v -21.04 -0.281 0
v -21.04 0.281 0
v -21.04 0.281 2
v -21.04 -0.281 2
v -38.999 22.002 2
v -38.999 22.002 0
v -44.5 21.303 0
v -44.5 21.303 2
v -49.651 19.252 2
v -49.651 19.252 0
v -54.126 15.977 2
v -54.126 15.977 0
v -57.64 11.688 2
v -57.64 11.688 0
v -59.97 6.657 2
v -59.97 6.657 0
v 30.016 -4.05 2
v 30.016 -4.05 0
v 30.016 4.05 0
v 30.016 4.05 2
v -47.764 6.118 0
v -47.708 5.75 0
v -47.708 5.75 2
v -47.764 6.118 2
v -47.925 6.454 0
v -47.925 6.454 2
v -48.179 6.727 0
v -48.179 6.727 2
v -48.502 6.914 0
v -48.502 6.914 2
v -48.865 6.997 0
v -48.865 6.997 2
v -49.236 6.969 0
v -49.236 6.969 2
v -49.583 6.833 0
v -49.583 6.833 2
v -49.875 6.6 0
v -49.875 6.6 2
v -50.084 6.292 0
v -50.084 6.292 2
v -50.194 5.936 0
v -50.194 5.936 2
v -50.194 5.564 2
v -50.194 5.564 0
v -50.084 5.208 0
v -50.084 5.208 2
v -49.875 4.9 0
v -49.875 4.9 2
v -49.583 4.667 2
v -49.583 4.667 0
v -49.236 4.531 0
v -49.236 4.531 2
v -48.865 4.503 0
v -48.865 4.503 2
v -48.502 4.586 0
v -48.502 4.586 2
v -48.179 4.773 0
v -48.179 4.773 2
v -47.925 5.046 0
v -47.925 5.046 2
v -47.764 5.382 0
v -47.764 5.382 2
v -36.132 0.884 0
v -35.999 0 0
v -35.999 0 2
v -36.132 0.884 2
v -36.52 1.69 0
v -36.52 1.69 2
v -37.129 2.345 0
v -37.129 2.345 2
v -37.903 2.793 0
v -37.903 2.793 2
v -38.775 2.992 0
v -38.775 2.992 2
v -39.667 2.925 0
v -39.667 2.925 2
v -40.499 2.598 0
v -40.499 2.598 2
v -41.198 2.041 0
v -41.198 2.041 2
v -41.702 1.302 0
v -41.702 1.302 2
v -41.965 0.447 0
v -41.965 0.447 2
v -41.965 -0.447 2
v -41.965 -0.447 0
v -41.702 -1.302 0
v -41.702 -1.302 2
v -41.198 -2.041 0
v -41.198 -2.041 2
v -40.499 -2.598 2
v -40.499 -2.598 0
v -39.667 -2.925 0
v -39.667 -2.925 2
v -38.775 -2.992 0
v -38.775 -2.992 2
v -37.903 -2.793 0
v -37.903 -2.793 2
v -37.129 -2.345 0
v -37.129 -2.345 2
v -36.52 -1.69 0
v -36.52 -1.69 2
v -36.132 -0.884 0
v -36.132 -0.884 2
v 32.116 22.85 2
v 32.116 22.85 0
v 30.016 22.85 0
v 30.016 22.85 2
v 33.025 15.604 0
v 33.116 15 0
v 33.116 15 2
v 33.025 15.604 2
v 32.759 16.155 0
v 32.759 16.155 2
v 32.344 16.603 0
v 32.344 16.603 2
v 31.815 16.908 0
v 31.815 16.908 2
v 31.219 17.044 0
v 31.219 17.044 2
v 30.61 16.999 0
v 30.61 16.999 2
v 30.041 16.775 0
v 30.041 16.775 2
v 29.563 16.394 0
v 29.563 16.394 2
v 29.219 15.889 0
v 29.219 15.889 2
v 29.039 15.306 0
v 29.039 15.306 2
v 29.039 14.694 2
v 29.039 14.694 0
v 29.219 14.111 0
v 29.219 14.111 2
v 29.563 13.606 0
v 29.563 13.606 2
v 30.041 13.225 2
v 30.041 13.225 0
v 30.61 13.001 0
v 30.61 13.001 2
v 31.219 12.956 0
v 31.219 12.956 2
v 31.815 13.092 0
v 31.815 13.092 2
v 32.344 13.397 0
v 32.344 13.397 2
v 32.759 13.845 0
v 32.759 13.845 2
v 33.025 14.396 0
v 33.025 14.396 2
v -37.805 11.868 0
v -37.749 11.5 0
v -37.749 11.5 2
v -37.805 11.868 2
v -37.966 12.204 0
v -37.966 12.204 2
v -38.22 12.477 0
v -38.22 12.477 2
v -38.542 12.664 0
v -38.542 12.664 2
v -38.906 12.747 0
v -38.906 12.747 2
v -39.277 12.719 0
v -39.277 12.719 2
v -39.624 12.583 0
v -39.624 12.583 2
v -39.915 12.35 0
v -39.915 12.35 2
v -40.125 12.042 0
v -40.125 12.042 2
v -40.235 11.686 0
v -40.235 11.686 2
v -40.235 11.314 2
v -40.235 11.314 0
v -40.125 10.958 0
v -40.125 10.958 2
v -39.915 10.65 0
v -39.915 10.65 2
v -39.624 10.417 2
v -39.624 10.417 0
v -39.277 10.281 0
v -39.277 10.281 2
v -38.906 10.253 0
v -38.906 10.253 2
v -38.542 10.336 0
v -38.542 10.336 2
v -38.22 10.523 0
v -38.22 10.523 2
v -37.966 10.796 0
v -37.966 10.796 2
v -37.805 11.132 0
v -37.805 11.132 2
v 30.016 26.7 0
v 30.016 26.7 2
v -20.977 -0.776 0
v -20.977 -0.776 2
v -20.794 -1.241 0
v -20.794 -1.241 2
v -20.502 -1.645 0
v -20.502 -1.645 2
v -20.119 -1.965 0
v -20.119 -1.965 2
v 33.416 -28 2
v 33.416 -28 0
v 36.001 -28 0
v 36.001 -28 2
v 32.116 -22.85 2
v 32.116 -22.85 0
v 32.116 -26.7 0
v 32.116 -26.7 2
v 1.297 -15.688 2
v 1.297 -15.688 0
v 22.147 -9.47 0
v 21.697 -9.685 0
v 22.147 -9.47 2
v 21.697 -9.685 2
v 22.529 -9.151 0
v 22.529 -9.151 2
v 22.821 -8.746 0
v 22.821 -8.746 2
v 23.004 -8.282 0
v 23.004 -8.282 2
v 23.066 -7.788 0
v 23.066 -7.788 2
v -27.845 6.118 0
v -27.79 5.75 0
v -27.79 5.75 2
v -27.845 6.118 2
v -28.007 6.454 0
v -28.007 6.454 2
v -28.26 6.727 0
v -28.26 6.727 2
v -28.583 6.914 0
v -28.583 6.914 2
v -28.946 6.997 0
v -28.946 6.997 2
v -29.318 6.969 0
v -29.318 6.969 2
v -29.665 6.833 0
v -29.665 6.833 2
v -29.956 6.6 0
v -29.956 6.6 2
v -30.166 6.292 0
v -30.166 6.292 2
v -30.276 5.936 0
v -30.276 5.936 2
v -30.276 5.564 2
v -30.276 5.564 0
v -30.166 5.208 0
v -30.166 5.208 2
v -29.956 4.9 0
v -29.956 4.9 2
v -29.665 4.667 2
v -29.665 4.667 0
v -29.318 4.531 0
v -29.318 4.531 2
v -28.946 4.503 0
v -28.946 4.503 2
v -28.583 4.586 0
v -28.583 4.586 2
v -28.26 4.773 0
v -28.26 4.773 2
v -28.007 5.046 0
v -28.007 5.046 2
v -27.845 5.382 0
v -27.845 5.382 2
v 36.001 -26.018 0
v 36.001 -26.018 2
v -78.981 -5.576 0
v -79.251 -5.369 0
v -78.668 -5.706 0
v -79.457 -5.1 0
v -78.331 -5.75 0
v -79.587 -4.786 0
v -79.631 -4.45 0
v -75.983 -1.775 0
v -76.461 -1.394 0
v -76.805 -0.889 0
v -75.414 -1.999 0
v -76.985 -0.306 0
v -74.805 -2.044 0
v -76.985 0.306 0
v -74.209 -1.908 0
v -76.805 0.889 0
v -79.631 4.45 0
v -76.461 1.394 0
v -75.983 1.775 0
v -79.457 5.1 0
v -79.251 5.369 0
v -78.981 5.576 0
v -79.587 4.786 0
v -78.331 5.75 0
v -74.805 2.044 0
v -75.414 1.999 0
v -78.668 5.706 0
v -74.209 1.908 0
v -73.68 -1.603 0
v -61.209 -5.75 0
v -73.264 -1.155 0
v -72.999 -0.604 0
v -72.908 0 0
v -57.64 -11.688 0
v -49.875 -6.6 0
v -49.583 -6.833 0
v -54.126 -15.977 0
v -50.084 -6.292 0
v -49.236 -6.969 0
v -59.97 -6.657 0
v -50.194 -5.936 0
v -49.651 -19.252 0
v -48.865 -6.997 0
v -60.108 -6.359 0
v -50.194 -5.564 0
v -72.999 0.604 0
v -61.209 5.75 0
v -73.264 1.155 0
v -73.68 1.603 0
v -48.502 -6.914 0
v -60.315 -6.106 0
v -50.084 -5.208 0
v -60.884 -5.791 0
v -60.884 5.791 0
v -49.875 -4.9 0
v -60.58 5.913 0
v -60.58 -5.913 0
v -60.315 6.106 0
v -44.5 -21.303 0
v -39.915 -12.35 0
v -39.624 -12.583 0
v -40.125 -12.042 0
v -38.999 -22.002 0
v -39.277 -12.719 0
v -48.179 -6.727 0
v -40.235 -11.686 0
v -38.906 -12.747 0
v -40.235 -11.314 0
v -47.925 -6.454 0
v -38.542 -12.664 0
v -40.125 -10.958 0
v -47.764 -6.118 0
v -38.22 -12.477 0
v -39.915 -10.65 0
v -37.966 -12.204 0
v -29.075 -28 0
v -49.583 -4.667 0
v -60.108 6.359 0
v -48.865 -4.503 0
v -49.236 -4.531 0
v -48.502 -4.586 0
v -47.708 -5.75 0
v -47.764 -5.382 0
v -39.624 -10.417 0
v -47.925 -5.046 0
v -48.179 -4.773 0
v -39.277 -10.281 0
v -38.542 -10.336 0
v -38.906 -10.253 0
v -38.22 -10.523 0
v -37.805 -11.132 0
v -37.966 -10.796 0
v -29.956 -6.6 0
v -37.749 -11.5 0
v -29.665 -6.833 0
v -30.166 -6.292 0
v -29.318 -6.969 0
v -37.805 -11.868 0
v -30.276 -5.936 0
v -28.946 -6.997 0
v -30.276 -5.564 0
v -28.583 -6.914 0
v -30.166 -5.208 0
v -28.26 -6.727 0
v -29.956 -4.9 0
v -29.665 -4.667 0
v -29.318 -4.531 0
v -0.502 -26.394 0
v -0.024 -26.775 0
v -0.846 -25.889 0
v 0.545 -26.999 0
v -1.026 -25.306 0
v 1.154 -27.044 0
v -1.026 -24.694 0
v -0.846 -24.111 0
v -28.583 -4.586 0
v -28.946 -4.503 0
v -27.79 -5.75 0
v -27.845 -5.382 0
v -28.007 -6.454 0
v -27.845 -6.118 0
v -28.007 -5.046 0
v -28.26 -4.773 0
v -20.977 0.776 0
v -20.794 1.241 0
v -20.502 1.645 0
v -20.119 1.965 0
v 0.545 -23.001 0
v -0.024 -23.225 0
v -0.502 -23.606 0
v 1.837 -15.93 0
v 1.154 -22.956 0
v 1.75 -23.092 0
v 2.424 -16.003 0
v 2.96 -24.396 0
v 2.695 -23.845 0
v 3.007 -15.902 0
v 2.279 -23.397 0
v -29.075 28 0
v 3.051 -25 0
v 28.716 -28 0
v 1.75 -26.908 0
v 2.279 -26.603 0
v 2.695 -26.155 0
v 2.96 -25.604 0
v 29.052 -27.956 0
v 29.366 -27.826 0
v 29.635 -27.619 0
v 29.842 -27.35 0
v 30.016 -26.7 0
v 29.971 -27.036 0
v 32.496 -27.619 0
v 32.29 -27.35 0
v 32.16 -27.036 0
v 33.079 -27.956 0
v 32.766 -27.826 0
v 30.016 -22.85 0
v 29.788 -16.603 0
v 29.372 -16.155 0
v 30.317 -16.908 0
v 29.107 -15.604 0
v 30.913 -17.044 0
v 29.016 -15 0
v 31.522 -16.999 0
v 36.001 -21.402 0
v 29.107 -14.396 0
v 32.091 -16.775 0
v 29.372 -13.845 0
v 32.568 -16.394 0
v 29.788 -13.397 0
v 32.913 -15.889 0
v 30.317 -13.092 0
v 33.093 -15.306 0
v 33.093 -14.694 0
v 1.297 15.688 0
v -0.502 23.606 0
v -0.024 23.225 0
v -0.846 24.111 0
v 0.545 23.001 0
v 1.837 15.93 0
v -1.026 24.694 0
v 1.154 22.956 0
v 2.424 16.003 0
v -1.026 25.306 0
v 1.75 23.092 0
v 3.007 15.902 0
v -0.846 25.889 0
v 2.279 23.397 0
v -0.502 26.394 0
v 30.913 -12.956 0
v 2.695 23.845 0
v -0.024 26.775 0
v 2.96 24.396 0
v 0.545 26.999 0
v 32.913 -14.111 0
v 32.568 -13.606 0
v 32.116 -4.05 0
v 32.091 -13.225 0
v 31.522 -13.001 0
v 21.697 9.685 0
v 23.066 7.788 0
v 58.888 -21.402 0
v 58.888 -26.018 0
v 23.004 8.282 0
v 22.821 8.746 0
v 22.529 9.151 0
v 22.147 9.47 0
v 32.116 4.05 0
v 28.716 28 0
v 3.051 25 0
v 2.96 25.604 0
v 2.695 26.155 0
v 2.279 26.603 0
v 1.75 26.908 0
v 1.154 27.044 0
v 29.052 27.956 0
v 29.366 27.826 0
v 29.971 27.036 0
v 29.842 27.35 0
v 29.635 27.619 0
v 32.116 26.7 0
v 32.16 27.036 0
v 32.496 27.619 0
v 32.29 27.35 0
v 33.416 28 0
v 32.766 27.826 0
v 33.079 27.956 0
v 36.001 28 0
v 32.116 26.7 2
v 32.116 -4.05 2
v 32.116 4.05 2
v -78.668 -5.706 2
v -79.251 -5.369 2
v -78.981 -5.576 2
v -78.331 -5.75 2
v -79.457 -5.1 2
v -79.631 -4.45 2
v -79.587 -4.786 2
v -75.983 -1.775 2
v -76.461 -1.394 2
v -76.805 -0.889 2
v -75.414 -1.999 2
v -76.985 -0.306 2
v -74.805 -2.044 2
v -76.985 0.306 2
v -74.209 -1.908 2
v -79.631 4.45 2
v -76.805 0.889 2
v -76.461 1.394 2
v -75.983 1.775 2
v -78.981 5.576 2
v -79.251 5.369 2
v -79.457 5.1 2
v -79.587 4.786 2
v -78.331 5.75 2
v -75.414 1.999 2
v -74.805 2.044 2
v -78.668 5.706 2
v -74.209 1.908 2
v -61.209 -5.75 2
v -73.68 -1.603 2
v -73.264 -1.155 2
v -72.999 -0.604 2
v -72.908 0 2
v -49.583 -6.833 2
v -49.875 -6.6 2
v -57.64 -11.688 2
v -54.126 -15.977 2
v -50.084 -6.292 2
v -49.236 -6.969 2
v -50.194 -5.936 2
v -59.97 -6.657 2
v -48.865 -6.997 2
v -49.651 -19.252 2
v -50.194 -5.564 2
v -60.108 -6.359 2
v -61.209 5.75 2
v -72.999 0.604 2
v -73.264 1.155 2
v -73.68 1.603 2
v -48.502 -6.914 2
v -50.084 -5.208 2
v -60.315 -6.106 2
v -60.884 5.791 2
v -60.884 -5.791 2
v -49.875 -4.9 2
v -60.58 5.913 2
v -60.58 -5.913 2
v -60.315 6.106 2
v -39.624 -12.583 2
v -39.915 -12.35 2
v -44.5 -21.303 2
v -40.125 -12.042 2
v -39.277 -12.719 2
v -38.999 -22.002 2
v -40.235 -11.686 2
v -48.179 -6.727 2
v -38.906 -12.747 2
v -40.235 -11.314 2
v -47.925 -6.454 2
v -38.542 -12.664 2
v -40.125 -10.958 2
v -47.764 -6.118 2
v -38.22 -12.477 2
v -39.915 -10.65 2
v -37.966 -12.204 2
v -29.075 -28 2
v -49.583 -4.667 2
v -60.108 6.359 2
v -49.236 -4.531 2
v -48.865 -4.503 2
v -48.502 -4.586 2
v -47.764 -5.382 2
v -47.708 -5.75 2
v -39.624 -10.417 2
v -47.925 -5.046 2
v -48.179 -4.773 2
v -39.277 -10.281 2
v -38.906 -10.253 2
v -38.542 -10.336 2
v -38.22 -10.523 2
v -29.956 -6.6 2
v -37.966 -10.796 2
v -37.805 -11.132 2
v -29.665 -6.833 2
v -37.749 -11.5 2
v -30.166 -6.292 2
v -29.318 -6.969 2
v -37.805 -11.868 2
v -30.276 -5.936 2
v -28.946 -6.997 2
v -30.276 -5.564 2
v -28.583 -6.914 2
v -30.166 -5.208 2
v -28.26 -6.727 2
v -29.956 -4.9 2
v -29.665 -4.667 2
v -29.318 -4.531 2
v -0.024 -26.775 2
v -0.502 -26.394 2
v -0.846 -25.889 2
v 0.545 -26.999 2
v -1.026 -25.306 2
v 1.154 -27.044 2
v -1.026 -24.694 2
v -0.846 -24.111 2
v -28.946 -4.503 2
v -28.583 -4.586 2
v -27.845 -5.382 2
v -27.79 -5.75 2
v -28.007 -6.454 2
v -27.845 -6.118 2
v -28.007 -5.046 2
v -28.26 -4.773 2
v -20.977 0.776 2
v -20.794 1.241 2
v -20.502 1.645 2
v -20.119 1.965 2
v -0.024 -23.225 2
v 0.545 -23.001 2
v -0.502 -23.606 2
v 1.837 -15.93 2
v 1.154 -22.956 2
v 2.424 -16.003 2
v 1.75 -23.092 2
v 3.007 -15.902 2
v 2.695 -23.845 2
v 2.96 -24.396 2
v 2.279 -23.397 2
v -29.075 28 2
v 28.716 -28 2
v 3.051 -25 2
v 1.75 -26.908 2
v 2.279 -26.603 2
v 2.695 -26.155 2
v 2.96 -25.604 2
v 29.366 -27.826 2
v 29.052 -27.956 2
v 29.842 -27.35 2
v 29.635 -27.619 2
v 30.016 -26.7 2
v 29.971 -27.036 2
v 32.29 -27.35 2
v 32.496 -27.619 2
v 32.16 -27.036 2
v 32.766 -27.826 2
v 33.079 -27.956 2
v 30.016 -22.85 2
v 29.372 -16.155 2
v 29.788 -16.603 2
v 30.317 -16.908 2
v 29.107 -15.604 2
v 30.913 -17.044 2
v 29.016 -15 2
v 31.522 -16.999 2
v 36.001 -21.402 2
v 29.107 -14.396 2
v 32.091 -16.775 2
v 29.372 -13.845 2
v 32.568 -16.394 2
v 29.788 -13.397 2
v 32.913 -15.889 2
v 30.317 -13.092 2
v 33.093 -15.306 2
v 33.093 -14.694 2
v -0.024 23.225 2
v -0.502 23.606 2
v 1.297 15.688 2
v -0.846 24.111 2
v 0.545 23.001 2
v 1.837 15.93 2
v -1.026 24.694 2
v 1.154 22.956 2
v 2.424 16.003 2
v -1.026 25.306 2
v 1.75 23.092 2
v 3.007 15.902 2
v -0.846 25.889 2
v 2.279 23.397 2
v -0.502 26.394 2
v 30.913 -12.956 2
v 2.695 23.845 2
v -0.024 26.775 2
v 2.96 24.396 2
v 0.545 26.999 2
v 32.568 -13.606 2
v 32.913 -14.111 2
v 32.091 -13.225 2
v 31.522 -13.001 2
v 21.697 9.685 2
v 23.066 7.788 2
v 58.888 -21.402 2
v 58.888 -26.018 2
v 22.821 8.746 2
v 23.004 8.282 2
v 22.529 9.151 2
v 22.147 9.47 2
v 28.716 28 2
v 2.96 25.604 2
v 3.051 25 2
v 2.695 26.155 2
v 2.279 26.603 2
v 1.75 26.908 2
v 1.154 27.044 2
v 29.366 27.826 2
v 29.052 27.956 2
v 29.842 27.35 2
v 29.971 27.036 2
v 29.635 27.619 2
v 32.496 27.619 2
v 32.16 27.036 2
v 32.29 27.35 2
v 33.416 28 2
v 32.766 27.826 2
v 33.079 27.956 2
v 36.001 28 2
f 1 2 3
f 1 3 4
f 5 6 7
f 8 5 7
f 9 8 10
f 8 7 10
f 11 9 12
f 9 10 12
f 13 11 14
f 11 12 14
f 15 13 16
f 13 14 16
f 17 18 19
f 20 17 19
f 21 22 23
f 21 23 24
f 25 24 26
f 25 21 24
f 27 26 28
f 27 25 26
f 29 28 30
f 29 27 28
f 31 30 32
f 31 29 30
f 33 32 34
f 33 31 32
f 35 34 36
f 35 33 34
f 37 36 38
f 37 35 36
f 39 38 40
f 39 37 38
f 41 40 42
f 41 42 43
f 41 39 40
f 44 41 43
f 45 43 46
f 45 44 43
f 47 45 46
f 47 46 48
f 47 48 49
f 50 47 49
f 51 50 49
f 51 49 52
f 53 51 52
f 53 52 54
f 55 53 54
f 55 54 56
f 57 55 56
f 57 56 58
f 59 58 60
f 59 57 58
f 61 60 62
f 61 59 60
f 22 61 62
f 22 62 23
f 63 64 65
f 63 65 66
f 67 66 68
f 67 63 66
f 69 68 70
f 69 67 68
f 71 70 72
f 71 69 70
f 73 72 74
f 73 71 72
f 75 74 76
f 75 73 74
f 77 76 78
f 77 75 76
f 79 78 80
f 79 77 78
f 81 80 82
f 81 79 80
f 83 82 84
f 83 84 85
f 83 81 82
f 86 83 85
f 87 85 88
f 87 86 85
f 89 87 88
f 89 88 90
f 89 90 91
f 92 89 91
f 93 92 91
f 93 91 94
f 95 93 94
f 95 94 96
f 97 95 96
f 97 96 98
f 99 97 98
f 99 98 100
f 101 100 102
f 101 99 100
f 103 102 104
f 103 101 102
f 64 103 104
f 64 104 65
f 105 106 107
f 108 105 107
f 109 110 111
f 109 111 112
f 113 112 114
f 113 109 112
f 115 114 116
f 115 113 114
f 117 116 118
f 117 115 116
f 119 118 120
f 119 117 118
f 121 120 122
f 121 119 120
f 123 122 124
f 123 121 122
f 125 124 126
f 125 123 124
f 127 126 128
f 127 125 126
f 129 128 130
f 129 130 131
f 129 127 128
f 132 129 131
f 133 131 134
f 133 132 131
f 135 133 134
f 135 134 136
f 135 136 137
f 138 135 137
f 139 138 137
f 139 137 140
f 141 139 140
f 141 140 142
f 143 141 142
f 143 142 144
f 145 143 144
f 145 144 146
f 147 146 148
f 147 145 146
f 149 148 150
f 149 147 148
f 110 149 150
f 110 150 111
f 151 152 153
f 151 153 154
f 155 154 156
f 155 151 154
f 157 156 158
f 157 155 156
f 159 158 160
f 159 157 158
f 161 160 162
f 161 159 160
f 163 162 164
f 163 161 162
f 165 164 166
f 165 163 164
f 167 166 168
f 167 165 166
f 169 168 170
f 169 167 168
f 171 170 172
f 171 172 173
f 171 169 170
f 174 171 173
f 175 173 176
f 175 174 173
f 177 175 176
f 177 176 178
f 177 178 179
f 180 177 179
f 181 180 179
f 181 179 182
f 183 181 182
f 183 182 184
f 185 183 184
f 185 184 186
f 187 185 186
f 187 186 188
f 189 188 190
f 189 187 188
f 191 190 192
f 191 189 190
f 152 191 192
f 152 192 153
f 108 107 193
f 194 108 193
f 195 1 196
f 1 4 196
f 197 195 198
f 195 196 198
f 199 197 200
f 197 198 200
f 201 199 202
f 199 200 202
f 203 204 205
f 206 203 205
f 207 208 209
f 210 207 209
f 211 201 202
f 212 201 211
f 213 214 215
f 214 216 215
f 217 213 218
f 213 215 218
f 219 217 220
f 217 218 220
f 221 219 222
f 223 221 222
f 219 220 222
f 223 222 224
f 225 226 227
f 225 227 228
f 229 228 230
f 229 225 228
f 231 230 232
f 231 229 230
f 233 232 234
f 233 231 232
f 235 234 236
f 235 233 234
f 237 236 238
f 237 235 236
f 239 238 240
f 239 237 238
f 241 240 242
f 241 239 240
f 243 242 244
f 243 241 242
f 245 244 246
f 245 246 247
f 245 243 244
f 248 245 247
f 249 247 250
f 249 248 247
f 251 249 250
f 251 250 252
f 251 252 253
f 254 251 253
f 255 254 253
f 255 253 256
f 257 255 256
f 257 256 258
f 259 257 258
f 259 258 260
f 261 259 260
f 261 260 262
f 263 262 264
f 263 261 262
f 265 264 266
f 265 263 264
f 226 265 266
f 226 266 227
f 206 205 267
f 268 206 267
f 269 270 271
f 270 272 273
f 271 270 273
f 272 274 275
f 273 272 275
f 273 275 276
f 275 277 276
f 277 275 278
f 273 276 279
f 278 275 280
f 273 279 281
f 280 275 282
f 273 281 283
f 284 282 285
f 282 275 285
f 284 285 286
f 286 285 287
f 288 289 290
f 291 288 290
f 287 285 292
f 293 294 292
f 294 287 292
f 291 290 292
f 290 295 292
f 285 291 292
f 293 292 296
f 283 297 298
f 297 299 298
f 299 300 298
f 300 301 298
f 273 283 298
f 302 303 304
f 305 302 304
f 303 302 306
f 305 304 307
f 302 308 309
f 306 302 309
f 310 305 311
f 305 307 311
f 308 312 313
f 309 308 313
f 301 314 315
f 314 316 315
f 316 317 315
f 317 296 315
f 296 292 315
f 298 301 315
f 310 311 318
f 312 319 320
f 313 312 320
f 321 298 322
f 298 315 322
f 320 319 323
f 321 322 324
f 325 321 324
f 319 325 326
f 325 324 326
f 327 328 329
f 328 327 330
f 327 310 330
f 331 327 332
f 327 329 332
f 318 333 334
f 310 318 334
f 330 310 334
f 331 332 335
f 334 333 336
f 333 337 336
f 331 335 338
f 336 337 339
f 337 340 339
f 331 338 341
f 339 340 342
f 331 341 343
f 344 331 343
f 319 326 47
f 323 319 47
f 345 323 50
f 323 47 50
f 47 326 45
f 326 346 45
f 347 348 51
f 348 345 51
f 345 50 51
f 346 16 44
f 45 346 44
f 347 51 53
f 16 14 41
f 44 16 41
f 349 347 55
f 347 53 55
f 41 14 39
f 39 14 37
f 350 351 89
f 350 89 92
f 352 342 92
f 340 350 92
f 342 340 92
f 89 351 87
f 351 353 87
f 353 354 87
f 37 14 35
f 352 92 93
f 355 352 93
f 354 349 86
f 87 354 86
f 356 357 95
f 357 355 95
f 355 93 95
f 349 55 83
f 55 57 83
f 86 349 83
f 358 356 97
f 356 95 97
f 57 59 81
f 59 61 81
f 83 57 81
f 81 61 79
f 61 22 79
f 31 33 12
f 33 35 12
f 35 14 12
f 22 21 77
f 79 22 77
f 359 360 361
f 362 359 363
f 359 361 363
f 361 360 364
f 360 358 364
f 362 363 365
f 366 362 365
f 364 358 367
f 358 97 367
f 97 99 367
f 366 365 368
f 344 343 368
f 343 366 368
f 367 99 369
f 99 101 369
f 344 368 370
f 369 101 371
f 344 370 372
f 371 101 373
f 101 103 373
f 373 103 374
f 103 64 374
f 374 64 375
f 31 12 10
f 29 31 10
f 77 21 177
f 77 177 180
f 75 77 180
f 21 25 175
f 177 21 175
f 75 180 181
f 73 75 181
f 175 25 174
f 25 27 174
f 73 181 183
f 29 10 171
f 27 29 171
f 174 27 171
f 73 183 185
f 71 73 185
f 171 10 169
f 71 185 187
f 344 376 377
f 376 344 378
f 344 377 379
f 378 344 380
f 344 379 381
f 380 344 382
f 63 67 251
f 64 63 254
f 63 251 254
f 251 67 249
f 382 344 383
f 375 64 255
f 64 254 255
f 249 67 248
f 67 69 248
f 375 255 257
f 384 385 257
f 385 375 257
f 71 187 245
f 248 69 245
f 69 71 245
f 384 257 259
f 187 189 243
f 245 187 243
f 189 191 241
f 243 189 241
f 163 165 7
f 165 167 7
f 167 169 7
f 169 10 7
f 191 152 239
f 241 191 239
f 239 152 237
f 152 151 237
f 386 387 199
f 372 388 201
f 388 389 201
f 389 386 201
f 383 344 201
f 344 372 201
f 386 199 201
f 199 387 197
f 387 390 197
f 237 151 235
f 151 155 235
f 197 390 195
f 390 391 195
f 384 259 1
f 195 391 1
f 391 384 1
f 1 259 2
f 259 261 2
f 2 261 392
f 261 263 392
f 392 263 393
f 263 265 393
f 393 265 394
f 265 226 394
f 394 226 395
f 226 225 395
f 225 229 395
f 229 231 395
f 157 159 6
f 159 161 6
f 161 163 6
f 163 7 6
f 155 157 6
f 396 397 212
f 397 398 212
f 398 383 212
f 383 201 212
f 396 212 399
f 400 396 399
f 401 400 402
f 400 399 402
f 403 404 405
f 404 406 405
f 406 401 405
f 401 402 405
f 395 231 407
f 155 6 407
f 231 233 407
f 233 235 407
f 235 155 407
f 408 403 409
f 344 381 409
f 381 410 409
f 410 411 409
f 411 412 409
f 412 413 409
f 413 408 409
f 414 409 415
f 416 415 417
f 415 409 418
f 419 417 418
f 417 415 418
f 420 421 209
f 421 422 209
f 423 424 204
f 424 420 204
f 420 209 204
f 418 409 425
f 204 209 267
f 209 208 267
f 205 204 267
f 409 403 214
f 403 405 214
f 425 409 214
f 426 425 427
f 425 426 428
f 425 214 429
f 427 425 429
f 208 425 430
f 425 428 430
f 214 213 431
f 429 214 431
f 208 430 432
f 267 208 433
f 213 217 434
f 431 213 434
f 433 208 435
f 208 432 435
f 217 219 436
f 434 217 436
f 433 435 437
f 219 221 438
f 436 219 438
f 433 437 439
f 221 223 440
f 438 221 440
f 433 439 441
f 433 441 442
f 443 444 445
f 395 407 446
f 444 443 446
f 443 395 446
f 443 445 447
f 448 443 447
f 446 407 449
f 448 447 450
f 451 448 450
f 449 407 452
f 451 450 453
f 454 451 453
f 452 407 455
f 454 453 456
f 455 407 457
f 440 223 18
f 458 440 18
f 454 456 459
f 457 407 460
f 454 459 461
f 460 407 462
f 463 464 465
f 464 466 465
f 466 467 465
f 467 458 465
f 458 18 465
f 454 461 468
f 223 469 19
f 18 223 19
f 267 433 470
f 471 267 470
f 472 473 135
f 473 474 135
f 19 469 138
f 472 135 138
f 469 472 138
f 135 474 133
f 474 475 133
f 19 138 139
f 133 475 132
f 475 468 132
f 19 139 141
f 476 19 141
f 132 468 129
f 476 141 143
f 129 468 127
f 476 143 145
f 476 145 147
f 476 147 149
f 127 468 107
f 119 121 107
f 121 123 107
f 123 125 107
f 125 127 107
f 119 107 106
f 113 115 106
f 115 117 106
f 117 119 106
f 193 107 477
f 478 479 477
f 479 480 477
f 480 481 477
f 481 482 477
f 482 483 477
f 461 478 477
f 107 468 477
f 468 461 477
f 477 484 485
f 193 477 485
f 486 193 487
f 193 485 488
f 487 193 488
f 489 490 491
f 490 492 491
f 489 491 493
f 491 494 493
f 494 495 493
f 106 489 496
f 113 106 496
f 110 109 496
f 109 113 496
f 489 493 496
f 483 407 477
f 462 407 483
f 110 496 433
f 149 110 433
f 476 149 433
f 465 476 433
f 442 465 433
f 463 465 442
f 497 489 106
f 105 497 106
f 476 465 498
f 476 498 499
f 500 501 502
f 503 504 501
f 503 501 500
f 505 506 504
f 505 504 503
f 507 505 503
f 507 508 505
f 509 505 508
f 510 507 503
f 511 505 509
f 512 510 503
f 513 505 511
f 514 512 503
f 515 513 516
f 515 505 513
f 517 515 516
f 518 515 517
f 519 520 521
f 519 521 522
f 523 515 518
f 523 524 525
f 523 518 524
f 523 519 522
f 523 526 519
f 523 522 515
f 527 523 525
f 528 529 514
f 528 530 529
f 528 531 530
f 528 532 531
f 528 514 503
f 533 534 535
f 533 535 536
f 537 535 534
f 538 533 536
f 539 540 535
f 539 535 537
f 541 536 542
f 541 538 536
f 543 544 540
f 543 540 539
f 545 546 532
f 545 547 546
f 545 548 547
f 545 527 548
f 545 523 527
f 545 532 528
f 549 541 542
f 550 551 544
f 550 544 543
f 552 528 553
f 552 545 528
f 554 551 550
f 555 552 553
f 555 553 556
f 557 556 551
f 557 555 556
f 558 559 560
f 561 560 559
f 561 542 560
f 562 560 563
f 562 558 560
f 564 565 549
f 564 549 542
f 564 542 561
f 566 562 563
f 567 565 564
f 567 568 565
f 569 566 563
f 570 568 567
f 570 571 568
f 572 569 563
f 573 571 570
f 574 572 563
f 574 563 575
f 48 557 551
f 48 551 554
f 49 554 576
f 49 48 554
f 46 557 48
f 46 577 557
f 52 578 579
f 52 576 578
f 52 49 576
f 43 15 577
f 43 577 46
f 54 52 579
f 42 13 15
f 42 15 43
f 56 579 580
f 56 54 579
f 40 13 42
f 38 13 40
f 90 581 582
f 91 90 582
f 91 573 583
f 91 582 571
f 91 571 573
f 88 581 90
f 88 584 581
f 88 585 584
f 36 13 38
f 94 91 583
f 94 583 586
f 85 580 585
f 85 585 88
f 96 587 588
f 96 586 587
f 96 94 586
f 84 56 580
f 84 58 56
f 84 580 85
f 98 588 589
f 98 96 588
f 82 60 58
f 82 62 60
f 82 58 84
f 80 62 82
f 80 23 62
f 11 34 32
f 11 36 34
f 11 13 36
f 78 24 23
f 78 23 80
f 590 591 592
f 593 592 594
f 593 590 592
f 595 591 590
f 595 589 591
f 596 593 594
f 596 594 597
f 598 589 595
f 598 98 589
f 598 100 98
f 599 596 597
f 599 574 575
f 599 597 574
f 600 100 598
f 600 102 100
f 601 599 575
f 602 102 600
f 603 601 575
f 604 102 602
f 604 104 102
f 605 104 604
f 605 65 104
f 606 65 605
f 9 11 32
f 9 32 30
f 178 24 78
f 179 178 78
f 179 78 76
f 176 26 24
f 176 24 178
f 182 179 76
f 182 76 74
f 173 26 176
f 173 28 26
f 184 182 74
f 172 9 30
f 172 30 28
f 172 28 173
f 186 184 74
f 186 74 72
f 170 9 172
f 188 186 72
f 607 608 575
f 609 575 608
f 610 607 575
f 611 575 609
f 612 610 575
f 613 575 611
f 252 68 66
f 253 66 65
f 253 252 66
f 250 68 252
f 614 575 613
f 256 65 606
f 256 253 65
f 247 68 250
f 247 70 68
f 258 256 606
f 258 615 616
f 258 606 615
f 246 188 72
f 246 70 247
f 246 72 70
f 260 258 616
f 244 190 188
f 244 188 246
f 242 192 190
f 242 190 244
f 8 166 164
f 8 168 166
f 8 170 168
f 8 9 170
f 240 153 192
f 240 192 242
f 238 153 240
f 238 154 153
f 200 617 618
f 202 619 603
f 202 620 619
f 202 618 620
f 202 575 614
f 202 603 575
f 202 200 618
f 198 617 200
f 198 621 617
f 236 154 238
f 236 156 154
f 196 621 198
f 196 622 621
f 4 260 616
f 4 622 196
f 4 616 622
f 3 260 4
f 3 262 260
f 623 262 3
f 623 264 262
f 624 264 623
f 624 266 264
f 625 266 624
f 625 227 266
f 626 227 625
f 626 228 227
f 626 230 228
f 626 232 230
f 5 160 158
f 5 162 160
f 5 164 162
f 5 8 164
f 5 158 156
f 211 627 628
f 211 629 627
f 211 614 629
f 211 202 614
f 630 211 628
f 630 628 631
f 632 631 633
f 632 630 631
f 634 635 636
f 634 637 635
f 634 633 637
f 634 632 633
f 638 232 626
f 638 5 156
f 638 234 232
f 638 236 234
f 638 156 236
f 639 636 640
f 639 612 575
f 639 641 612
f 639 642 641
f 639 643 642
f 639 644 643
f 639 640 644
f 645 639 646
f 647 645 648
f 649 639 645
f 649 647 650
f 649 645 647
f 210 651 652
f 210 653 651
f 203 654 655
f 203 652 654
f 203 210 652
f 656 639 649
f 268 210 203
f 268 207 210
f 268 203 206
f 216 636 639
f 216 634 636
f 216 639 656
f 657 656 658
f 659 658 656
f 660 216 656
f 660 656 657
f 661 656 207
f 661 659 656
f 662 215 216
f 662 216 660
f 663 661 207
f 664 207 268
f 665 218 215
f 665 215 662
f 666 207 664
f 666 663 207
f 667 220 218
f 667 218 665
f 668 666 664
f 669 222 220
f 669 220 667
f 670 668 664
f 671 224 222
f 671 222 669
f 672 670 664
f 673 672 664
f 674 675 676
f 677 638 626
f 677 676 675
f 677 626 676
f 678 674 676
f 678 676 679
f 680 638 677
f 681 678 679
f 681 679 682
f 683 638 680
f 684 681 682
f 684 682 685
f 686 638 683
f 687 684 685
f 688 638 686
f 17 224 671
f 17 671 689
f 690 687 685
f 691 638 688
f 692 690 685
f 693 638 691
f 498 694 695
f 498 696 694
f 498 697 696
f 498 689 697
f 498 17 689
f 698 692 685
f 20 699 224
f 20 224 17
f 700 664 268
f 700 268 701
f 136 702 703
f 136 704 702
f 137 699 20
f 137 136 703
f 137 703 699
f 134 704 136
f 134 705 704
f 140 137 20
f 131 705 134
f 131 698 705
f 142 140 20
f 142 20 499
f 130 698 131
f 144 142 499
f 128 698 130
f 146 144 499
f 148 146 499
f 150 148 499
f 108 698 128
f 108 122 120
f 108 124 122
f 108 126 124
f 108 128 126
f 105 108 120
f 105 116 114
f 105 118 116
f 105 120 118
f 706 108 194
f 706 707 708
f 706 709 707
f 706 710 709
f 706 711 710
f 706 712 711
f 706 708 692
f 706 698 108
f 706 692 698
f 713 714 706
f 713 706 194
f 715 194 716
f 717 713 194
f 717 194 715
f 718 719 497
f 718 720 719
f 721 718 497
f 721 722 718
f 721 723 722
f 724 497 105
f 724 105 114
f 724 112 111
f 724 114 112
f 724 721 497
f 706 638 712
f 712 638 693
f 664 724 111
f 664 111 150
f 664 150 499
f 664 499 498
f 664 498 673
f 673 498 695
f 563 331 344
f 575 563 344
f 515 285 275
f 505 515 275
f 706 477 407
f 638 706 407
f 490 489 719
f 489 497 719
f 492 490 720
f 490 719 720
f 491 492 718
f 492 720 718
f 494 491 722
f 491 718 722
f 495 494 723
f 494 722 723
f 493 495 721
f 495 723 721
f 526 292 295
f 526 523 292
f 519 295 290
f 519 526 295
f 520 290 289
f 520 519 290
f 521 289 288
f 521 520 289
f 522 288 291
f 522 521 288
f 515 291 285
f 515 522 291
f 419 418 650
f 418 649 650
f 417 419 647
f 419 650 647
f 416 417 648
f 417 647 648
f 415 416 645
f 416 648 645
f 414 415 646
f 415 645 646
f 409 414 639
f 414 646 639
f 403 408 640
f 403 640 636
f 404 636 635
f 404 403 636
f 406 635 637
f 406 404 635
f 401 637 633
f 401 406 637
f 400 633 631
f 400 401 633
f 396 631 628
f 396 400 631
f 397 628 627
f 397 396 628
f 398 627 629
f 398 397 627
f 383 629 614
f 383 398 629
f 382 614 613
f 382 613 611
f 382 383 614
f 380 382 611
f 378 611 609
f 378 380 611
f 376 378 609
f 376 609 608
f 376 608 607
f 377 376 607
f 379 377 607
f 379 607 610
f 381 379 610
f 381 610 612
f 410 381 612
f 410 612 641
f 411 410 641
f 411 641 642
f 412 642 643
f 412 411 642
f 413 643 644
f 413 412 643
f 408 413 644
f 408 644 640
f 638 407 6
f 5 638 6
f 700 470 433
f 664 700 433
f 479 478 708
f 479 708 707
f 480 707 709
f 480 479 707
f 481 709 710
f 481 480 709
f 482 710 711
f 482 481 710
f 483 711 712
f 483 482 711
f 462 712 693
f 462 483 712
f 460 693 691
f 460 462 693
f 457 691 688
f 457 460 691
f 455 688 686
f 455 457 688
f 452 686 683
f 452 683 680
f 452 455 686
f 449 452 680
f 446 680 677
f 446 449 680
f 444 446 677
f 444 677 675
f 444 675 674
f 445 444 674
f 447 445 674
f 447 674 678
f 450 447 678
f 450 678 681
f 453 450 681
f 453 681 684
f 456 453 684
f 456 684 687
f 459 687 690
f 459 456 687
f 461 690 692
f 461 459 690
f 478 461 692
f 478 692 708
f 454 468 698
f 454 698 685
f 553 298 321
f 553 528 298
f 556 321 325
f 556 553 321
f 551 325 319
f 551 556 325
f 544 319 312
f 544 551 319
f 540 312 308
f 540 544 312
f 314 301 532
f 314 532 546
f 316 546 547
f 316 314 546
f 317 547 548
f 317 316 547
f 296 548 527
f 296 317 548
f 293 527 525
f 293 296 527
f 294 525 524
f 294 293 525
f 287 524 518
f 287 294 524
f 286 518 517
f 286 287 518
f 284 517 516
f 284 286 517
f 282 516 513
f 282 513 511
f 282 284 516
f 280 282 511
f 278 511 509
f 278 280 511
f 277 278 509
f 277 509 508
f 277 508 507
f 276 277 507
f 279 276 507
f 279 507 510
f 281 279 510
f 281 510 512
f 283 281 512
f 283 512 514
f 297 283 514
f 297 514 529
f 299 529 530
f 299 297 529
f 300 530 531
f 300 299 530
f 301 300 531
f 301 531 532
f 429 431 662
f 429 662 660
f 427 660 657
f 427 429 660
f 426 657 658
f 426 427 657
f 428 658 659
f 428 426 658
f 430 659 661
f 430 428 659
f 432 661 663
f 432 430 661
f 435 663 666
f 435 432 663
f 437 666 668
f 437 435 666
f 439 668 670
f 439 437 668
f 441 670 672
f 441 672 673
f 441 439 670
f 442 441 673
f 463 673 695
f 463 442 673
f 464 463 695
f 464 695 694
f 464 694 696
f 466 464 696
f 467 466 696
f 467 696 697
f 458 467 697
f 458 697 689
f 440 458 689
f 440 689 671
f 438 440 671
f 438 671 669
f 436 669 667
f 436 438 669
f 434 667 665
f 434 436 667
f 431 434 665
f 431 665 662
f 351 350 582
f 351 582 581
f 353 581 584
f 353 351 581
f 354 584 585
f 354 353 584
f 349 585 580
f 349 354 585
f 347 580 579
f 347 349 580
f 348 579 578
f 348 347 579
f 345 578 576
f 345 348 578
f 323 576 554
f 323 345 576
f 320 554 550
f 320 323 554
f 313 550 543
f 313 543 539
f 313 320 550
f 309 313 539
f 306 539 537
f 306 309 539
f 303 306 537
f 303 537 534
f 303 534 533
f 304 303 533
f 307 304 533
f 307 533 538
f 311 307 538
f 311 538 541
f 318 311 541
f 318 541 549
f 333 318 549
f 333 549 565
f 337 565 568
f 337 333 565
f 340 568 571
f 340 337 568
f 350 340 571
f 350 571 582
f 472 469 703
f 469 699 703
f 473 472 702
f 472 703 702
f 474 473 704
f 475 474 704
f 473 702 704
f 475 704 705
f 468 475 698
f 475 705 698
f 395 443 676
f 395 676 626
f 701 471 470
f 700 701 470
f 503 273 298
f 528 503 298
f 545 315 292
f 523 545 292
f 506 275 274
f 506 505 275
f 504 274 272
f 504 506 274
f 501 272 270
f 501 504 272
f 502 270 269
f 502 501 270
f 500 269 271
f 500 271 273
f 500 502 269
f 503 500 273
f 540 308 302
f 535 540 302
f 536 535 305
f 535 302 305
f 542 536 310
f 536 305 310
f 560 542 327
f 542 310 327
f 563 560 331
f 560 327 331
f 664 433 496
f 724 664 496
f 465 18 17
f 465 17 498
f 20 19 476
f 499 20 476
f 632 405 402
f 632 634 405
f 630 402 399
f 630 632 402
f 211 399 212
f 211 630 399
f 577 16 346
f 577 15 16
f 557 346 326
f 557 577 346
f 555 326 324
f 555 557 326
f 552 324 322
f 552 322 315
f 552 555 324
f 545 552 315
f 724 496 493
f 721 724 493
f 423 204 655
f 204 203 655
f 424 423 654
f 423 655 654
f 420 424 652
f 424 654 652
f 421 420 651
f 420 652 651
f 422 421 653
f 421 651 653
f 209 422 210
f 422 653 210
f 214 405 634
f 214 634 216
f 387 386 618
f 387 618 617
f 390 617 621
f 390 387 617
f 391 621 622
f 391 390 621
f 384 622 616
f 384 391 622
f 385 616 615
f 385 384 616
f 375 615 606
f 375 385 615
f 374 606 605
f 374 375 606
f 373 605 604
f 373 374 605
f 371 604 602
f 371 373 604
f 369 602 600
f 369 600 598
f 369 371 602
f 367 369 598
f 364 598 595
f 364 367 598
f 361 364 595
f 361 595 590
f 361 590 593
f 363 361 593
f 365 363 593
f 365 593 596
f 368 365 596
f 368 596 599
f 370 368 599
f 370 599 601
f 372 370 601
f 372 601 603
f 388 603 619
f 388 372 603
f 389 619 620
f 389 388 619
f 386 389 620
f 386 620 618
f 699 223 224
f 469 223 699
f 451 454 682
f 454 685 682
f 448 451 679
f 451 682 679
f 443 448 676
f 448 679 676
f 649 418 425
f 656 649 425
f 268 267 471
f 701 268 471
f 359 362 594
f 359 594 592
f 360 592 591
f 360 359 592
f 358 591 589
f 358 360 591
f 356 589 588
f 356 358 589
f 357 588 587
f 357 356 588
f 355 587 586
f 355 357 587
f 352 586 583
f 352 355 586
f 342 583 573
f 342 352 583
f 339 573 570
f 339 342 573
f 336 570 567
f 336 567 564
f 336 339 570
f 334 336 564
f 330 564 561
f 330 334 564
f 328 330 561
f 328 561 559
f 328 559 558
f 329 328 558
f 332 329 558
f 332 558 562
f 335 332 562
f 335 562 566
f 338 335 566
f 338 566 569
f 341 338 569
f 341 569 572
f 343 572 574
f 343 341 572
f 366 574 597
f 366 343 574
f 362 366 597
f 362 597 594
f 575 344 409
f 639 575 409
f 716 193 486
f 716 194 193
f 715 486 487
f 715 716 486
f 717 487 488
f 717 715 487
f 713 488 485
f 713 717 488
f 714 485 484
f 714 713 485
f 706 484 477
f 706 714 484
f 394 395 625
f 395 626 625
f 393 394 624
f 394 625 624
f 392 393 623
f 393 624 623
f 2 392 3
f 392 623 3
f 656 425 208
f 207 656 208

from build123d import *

# Parameters (mm, degrees)
SKETCH_1_R      = 2.05
SKETCH_1_R_2    = 3
SKETCH_1_R_3    = 1.25
SKETCH_1_W      = 2.1
SKETCH_1_H      = 8.1
EXTRUDE_1_DEPTH = 2
FILLET_1_R      = 1.3
FILLET_2_R      = 2


with BuildPart() as part:
    # 草图1 → 凸台-拉伸1 (new body)
    with BuildSketch(Plane.XY):
        with BuildLine():
            Line((32.115707856, 28), (32.115707856, 22.85))
            Line((32.115707856, 22.85), (30.015707856, 22.85))
            Line((30.015707856, 22.85), (30.015707856, 28))
            Line((30.015707856, 28), (-29.075, 28))
            Line((-29.075, 28), (-38.998995168, 22.002009663))
            ThreePointArc((-38.998995168, 22.002009663), (-52.370174504, 17.472835843), (-60.236366221, 5.75))
            Line((-60.236366221, 5.75), (-79.631279411, 5.75))
            Line((-79.631279411, 5.75), (-79.631279411, -5.75))
            Line((-79.631279411, -5.75), (-60.236366221, -5.75))
            ThreePointArc((-60.236366221, -5.75), (-52.370174504, -17.472835843), (-38.998995168, -22.002009663))
            Line((-38.998995168, -22.002009663), (-29.075, -28))
            Line((-29.075, -28), (30.015707856, -28))
            Line((30.015707856, -28), (30.015707856, -22.85))
            Line((30.015707856, -22.85), (32.115707856, -22.85))
            Line((32.115707856, -22.85), (32.115707856, -28))
            Line((32.115707856, -28), (36.001004832, -28))
            Line((36.001004832, -28), (36.001004832, -26.017733681))
            Line((36.001004832, -26.017733681), (58.888331717, -26.017733681))
            Line((58.888331717, -26.017733681), (58.888331717, -21.401911511))
            Line((58.888331717, -21.401911511), (36.001004832, -21.401911511))
            Line((36.001004832, -21.401911511), (36.001004832, 28))
            Line((36.001004832, 28), (32.115707856, 28))
        make_face()
        with Locations((31.065707856, 15)):
            Circle(SKETCH_1_R, mode=Mode.SUBTRACT)
        with Locations(Location((31.065707856, -15, 0), (0, 0, 180))):
            Circle(SKETCH_1_R, mode=Mode.SUBTRACT)
        with Locations((-38.998995168, 0)):
            Circle(SKETCH_1_R_2, mode=Mode.SUBTRACT)
        with Locations((-38.998995168, -11.5)):
            Circle(SKETCH_1_R_3, mode=Mode.SUBTRACT)
        with Locations((-48.958287312, -5.75)):
            Circle(SKETCH_1_R_3, mode=Mode.SUBTRACT)
        with Locations((-48.958287312, 5.75)):
            Circle(SKETCH_1_R_3, mode=Mode.SUBTRACT)
        with Locations((-38.998995168, 11.5)):
            Circle(SKETCH_1_R_3, mode=Mode.SUBTRACT)
        with Locations((-29.039703025, 5.75)):
            Circle(SKETCH_1_R_3, mode=Mode.SUBTRACT)
        with Locations((-29.039703025, -5.75)):
            Circle(SKETCH_1_R_3, mode=Mode.SUBTRACT)
        with Locations((1.001004832, -25)):
            Circle(SKETCH_1_R, mode=Mode.SUBTRACT)
        with Locations((1.001004832, 25)):
            Circle(SKETCH_1_R, mode=Mode.SUBTRACT)
        with Locations((-74.958287312, 0)):
            Circle(SKETCH_1_R, mode=Mode.SUBTRACT)
        with Locations((31.065707856, 0)):
            Rectangle(SKETCH_1_W, SKETCH_1_H, mode=Mode.SUBTRACT)
        Polygon((2.100885183, -16.20323489), (23.065707856, -9.230000311), (23.065707856, 9.230000311), (2.100885183, 16.20323489), (-21.039703025, 1.3748119), (-21.039703025, -1.3748119), align=None, mode=Mode.SUBTRACT)
    extrude(amount=EXTRUDE_1_DEPTH)

    # 圆角1
    fillet_1_edges = [part.edges().sort_by_distance(p)[0] for p in [
        (-60.236366221, -5.75, 1),
        (-79.631279411, -5.75, 1),
        (-79.631279411, 5.75, 1),
        (-60.236366221, 5.75, 1),
        (30.015707856, 28, 1),
        (32.115707856, 28, 1),
        (32.115707856, -28, 1),
        (30.015707856, -28, 1),
    ]]
    fillet(fillet_1_edges, radius=FILLET_1_R)

    # 圆角2
    fillet_2_edges = [part.edges().sort_by_distance(p)[0] for p in [
        (-21.039703025, -1.3748119, 1),
        (2.100885183, -16.20323489, 1),
        (23.065707856, -9.230000311, 1),
        (23.065707856, 9.230000311, 1),
        (2.100885183, 16.20323489, 1),
        (-21.039703025, 1.3748119, 1),
    ]]
    fillet(fillet_2_edges, radius=FILLET_2_R)


solid = part.part
